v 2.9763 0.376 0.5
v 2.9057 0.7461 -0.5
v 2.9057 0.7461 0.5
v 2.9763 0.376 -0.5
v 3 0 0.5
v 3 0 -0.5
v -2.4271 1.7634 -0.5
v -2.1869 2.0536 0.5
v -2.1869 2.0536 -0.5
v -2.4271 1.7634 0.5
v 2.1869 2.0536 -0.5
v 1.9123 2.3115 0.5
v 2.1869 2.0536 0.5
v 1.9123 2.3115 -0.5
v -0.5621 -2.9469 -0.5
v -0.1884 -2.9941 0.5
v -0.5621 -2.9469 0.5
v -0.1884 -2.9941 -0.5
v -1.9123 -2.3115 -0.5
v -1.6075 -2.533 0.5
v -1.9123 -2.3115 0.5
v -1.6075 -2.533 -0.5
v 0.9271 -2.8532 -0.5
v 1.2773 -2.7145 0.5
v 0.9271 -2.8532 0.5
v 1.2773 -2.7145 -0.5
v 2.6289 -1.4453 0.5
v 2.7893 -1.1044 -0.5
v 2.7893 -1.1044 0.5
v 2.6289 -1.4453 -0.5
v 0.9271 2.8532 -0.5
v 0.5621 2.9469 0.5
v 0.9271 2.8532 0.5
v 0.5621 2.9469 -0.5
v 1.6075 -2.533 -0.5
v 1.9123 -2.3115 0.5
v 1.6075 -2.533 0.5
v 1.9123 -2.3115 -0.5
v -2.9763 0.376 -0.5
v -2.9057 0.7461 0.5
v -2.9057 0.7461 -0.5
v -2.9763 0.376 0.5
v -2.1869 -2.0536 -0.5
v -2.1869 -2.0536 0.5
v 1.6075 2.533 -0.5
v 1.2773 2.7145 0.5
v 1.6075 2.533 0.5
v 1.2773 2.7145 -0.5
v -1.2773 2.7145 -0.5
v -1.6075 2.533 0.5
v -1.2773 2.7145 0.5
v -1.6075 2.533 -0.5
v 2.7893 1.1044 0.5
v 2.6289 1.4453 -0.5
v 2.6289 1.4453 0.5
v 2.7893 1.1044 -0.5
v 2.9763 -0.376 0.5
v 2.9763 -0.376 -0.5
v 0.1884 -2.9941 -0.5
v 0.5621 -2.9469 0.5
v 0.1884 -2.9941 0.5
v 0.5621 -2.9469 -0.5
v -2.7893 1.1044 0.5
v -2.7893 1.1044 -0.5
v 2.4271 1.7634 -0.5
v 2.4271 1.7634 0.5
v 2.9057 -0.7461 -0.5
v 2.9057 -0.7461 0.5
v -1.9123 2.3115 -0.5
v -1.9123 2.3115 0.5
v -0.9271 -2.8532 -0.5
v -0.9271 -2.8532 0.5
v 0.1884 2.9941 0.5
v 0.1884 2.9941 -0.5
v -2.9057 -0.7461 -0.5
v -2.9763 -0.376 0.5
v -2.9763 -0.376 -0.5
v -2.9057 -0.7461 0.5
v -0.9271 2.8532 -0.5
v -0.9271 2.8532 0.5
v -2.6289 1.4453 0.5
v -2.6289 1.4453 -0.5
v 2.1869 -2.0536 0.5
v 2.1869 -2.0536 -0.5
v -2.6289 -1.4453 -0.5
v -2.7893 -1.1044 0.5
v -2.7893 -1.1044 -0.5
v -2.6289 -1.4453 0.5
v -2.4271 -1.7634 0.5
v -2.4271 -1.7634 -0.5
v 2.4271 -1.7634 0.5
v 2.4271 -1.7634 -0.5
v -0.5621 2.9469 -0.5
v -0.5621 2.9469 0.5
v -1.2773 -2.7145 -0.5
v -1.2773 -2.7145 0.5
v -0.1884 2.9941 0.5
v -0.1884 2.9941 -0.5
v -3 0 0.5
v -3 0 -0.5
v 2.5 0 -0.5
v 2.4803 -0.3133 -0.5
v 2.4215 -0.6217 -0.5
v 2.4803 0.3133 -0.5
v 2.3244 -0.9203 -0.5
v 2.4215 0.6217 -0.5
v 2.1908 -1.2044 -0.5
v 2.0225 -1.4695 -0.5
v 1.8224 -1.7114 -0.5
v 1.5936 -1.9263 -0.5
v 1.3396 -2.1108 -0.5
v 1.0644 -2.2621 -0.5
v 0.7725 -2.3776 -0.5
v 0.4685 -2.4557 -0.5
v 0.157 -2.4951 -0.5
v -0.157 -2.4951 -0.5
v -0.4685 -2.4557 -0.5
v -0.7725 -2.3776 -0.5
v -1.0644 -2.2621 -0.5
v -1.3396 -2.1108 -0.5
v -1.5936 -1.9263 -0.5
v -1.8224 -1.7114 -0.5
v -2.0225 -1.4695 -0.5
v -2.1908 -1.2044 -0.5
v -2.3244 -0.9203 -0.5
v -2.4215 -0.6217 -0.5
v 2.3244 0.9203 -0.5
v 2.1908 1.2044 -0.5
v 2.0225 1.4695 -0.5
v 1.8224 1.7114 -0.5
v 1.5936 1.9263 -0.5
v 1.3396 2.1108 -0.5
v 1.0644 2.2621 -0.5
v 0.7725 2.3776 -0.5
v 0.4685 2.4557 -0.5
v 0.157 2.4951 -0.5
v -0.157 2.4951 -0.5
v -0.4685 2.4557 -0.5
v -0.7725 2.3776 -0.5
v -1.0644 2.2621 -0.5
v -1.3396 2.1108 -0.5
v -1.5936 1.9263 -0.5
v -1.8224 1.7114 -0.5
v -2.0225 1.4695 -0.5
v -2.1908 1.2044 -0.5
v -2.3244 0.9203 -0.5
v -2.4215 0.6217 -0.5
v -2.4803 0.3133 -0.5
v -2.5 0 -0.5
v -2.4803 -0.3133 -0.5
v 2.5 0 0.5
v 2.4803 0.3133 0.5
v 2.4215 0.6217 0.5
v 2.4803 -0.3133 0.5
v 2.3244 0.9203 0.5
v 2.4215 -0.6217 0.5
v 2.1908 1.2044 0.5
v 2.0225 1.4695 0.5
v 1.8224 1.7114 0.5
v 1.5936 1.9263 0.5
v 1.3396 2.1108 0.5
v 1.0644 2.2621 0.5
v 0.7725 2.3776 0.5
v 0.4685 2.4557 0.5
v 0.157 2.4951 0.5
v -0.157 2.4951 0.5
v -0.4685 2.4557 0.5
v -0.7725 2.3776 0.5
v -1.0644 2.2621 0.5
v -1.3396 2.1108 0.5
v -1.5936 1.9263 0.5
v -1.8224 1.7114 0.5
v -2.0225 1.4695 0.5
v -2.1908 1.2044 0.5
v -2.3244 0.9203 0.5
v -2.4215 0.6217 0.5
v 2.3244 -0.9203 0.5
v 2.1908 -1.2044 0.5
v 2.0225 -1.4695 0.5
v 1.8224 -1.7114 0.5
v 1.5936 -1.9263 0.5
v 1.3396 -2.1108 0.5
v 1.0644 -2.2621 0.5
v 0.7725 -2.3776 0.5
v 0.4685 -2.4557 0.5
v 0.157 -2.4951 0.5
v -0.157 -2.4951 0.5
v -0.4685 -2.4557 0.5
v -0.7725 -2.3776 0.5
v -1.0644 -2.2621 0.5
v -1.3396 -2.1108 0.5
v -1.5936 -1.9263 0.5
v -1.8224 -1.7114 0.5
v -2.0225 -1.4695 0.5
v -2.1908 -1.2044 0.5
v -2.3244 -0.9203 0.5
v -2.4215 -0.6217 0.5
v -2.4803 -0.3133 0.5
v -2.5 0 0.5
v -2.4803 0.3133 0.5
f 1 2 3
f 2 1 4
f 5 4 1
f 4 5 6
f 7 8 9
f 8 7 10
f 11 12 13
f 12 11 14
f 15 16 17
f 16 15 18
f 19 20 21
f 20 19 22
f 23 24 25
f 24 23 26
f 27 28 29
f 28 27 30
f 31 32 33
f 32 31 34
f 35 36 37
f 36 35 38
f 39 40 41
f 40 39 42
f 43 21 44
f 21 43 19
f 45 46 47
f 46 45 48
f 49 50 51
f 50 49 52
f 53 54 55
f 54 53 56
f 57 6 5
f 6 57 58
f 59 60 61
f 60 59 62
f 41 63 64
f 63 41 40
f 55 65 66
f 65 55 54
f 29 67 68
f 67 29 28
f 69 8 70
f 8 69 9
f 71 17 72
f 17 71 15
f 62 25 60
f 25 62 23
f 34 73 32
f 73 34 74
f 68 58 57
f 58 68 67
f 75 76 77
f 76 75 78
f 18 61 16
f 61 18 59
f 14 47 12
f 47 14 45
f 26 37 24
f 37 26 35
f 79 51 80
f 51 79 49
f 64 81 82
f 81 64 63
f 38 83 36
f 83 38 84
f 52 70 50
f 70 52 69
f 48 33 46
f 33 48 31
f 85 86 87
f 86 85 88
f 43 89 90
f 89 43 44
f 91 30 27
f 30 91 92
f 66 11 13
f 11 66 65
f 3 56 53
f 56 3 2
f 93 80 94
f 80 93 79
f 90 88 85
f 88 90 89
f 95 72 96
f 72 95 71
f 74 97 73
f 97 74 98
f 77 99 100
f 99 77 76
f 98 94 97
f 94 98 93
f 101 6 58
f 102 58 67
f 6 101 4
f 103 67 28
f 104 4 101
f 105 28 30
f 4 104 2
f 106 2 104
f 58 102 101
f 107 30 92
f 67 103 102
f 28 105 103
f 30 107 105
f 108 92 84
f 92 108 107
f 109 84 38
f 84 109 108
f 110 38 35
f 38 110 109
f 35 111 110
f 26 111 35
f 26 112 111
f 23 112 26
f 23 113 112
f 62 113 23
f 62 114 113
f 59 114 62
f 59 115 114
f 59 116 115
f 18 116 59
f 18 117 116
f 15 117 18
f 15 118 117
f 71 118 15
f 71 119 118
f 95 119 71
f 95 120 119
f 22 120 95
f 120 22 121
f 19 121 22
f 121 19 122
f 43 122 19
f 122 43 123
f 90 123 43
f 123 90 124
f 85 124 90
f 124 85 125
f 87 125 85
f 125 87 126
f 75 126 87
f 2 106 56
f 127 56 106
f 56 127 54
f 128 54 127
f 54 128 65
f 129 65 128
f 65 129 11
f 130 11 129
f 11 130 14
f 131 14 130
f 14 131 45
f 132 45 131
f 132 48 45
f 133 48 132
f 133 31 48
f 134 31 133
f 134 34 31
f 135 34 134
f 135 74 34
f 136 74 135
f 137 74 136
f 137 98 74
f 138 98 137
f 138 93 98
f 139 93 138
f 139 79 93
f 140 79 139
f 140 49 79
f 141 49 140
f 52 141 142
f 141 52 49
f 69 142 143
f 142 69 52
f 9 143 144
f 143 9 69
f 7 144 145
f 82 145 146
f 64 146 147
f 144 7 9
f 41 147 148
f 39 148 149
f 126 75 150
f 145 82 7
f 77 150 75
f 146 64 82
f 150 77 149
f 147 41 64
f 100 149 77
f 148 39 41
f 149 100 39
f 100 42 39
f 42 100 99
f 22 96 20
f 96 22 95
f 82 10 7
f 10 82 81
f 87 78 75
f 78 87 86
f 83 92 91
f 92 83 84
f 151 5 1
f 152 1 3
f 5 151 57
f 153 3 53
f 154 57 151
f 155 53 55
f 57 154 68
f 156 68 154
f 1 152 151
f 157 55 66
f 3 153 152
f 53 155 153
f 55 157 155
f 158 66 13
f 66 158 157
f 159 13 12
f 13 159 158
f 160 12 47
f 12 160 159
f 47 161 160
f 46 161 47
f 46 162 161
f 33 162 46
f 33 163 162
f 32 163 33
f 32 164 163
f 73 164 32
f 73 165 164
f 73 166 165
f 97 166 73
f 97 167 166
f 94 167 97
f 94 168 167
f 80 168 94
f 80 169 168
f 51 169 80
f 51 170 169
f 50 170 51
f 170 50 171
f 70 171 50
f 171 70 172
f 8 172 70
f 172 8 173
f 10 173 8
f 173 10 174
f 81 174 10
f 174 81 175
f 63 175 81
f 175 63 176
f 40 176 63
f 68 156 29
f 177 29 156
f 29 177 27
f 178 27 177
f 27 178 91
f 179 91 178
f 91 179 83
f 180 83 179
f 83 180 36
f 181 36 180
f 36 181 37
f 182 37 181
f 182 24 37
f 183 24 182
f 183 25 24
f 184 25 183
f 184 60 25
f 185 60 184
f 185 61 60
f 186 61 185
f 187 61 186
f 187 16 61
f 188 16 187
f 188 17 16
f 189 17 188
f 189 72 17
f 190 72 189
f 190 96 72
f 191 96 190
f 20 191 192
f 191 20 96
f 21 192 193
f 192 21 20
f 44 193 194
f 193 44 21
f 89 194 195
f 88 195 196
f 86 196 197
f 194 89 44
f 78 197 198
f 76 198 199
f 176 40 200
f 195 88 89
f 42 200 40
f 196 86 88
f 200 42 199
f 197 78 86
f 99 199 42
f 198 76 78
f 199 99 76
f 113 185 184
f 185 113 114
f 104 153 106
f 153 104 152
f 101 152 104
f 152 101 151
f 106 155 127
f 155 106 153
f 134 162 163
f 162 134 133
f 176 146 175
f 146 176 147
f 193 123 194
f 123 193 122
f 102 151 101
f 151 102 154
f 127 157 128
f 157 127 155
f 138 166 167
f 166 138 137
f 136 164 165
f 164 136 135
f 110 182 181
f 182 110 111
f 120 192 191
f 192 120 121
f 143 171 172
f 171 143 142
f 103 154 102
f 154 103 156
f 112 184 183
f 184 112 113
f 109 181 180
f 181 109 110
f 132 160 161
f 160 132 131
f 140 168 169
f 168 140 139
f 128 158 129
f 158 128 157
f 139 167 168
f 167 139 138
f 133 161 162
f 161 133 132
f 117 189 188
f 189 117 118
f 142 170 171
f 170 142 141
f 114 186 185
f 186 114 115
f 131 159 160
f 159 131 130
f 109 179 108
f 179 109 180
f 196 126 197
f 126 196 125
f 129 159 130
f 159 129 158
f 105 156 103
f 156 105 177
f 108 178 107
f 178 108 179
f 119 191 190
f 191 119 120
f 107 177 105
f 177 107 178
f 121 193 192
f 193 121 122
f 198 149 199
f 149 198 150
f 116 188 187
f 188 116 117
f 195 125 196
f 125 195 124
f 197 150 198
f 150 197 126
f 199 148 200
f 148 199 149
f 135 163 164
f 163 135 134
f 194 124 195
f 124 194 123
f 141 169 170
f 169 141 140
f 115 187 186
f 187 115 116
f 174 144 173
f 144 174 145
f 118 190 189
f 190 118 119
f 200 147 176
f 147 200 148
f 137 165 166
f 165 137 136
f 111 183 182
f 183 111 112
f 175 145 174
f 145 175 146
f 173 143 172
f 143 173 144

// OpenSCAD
$fn = 50;


difference() {
	union() {
		translate(v = [0, 0, -0.5000000000]) {
			cylinder(h = 1, r = 3.0000000000);
		}
	}
	union() {
		translate(v = [0, 0, -100.0000000000]) {
			cylinder(h = 200, r = 2.5000000000);
		}
	}
}
